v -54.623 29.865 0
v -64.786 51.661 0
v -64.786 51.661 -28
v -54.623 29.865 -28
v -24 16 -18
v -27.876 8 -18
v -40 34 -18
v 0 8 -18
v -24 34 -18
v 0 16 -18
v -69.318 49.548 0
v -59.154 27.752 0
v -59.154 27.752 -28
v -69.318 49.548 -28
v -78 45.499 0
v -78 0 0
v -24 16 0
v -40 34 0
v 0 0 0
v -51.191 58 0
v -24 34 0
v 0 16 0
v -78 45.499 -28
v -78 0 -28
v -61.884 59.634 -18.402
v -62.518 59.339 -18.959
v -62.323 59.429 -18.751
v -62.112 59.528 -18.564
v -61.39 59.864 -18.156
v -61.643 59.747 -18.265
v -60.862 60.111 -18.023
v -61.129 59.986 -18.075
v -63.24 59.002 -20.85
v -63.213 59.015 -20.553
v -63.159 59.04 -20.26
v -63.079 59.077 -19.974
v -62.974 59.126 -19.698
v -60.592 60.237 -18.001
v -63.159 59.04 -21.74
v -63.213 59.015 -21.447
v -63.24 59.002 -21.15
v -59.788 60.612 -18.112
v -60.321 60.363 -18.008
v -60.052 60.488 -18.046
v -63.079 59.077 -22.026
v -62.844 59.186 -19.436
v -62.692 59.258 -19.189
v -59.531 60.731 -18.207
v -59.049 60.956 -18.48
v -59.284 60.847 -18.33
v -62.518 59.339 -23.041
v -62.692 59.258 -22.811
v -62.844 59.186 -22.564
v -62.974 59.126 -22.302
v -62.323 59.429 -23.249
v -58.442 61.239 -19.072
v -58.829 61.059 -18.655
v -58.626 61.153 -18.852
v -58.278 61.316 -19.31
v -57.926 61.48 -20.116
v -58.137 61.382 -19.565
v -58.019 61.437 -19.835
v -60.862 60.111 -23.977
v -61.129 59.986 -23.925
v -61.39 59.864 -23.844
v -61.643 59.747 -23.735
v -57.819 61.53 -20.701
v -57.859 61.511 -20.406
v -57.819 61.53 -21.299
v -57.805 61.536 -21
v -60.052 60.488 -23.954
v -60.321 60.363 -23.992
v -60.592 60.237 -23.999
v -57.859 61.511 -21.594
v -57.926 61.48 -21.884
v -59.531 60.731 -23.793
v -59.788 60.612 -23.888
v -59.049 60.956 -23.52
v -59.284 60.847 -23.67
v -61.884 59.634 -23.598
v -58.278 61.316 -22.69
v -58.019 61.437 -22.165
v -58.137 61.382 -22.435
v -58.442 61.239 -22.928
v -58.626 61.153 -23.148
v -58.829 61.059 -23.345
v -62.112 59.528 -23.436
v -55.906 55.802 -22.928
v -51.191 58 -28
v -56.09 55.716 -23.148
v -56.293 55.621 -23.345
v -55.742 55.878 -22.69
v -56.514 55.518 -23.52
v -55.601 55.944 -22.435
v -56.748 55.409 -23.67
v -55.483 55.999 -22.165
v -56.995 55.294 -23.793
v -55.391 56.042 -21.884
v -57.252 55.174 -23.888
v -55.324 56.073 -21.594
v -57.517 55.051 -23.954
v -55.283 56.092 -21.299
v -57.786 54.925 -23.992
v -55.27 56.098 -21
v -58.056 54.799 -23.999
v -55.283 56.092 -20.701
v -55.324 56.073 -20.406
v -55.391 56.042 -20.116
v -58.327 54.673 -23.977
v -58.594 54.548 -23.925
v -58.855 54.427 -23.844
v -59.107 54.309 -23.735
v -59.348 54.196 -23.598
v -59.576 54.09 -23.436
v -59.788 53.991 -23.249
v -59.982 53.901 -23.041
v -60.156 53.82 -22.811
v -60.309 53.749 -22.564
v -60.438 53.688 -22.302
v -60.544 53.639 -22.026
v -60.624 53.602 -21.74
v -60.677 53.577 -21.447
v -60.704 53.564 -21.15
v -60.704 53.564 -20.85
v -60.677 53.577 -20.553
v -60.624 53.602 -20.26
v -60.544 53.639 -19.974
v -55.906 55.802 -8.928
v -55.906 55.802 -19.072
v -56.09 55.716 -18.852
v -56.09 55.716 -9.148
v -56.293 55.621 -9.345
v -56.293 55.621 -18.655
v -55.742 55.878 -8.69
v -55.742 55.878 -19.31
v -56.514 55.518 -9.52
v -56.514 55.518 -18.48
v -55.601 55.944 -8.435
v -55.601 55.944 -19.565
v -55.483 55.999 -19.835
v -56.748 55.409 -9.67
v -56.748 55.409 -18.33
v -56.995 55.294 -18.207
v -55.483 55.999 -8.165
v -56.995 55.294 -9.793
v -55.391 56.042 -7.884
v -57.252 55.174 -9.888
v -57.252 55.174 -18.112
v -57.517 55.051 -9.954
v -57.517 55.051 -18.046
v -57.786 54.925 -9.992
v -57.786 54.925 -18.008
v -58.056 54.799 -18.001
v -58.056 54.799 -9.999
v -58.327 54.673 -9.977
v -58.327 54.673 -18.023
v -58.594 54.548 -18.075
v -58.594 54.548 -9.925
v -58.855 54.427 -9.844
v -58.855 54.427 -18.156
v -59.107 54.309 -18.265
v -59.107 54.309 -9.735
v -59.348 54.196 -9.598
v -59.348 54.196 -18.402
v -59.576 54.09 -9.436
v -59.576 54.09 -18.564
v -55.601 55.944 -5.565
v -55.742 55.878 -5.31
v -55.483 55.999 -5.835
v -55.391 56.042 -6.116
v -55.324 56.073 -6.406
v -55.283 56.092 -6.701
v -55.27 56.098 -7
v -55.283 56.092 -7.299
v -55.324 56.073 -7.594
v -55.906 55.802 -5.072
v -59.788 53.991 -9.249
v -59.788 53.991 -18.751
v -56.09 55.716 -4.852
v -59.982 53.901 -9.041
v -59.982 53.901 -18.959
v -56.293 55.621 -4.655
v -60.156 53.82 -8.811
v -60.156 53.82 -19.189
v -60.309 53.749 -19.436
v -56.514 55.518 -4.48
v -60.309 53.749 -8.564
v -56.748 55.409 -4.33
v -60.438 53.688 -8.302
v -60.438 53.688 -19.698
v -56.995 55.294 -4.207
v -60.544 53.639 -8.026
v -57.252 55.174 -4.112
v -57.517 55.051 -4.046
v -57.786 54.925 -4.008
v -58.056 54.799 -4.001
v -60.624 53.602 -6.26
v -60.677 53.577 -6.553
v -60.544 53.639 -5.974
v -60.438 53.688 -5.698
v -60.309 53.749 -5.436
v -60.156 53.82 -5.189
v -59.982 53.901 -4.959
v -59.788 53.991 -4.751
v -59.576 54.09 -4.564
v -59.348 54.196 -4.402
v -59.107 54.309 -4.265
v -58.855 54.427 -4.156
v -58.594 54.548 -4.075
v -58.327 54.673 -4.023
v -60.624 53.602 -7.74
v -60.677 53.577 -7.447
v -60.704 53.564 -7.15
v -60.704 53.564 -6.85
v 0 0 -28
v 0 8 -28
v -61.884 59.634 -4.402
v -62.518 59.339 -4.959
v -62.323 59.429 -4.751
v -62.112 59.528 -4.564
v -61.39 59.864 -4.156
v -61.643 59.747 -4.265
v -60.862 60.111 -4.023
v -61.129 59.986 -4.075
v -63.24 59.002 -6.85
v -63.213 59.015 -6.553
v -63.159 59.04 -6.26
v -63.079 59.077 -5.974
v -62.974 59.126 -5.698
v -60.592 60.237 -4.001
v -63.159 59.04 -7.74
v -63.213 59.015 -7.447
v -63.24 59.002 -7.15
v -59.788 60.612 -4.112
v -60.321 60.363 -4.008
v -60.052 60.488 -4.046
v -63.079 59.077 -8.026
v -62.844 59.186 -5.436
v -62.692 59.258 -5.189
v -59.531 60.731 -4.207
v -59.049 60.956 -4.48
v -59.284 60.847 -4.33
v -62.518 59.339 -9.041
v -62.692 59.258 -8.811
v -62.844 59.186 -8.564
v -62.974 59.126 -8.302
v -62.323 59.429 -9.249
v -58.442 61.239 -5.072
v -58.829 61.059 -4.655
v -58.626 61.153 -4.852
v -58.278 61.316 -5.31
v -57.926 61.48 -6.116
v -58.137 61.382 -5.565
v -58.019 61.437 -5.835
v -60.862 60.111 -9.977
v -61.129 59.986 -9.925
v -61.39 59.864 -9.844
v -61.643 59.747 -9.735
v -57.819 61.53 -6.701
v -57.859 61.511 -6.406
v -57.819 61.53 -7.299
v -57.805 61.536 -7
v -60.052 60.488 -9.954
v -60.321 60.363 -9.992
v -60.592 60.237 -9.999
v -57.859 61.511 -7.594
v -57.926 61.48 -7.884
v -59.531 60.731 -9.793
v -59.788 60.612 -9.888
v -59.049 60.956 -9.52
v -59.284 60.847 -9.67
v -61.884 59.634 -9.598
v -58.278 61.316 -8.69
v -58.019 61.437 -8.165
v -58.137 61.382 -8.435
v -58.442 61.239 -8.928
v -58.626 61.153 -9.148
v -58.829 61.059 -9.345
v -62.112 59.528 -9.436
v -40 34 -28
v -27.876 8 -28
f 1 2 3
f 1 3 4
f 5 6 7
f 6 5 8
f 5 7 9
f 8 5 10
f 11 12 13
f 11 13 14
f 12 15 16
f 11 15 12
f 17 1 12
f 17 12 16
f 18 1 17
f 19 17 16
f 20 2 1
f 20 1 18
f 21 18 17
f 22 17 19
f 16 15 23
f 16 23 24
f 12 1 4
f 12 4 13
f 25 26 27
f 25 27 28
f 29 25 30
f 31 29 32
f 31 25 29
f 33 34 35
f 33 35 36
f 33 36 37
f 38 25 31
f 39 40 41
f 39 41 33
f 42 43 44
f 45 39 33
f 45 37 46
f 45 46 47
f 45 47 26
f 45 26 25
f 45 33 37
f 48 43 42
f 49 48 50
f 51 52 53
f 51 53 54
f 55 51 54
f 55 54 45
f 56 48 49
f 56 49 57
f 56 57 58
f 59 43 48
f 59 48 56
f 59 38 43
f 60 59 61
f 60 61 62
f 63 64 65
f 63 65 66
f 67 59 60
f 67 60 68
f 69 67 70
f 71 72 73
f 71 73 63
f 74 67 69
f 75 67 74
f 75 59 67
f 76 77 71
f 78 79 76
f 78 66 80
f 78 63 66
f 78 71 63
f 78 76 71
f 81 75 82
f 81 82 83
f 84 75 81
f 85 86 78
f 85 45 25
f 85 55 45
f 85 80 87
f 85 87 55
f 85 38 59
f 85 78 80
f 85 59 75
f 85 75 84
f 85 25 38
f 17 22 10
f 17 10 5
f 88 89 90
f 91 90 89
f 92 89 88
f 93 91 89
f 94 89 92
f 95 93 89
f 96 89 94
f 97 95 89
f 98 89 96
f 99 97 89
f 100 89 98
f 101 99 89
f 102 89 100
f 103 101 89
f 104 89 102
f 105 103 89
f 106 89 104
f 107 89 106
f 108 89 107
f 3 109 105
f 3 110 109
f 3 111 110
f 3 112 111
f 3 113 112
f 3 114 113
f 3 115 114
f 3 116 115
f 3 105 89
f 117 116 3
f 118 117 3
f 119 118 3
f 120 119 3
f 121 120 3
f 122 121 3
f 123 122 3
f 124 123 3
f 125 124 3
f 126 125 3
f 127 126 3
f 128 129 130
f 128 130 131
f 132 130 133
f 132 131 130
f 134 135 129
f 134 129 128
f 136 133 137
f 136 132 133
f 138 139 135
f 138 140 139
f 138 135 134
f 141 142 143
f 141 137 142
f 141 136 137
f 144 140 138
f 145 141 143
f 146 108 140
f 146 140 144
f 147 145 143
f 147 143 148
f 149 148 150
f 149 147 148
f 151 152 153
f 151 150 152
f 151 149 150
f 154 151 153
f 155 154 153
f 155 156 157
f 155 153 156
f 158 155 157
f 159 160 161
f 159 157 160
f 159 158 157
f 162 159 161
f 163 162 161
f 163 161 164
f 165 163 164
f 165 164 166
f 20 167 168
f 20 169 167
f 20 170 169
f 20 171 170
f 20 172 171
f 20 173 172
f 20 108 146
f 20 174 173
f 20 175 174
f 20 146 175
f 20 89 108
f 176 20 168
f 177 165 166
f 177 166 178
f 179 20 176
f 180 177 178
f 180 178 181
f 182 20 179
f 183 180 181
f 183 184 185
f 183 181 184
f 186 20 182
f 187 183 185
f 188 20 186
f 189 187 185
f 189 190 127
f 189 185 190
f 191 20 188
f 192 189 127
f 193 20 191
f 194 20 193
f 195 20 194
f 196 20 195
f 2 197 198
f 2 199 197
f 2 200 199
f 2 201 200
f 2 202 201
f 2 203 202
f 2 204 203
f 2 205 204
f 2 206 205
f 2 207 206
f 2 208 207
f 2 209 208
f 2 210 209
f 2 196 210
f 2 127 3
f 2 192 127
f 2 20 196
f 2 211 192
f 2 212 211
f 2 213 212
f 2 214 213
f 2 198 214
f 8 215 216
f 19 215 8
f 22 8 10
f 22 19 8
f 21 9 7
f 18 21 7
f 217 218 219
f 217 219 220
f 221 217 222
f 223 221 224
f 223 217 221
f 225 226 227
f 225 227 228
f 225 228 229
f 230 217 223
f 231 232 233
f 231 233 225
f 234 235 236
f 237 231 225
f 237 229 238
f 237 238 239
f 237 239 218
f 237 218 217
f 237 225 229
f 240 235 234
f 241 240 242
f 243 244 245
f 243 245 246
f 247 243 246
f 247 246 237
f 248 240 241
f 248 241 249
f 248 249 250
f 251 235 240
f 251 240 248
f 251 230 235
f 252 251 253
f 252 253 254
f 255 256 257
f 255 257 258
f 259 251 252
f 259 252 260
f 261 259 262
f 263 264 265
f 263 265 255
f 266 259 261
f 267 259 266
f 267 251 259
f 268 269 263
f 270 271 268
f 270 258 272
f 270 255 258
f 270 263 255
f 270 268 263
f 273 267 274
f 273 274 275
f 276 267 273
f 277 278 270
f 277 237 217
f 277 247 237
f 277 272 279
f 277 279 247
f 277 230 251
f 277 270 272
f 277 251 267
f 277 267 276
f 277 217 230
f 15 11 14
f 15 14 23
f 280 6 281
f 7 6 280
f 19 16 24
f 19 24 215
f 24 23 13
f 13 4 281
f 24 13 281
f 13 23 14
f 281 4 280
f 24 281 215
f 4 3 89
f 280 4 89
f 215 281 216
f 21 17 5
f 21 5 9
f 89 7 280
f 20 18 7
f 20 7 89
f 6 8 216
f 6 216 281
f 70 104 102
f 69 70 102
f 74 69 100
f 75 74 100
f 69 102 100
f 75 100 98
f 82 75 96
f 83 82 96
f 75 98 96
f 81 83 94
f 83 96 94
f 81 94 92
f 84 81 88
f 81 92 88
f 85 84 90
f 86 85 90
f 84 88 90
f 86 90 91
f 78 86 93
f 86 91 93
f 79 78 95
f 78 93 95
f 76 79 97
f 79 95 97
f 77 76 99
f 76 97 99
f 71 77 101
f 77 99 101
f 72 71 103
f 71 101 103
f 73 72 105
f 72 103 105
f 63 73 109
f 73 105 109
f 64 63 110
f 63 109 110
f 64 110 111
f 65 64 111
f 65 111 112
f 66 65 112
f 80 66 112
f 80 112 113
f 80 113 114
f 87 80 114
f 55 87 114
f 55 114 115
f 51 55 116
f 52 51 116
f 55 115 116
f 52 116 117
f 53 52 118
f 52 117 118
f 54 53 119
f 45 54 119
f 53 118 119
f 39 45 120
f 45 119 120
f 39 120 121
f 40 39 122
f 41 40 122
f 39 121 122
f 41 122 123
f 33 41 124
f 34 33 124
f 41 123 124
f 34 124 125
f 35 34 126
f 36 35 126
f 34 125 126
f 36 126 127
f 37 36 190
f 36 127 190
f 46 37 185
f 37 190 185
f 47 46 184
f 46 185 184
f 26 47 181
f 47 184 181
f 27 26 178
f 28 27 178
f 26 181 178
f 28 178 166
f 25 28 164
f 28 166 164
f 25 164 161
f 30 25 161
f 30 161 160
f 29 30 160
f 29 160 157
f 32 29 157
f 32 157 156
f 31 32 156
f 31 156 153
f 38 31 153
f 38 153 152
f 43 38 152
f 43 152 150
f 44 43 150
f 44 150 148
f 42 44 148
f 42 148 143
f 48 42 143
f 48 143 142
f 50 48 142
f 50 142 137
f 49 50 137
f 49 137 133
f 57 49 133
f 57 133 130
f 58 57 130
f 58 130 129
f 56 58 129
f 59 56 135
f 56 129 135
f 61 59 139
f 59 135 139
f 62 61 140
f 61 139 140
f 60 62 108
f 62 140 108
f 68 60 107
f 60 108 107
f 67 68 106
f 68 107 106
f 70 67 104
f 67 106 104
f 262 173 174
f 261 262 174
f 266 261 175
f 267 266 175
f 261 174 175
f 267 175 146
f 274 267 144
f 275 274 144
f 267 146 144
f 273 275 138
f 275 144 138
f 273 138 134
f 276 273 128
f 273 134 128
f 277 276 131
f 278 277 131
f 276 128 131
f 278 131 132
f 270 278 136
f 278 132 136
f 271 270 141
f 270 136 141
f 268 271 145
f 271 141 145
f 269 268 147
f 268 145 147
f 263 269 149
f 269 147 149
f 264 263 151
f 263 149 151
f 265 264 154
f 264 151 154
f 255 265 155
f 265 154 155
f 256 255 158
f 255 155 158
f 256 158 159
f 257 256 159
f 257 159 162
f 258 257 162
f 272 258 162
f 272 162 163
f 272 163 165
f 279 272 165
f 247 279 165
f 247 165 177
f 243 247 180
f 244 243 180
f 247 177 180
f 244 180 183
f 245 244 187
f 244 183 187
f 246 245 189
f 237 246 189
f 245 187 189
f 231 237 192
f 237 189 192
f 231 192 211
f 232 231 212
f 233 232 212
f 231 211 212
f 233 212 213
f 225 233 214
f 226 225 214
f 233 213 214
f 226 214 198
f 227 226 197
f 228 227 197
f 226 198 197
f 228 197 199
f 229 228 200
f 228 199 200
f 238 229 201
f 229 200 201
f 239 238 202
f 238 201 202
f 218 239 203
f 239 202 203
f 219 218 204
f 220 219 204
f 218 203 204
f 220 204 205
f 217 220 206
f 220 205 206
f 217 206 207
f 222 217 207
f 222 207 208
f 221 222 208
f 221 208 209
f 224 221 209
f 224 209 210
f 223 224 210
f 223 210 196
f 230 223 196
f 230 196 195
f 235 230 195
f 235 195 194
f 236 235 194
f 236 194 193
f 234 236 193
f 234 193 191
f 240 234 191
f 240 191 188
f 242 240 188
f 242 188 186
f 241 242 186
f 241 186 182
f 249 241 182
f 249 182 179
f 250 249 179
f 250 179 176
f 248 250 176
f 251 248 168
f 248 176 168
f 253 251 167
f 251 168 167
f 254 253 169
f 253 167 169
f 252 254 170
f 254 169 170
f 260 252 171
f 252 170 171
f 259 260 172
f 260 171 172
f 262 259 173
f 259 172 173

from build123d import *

# Parameters (mm, degrees)
BOSS_EXTRUDE1_DEPTH = 18
BOSS_EXTRUDE2_DEPTH = 28
SKETCH4_R           = 3
BOSS_EXTRUDE3_DEPTH = 6


with BuildPart() as part:
    # Sketch1 → Boss-Extrude1 (new body)
    with BuildSketch(Plane.XY):
        Polygon((-27.876000888, 8), (0, 8), (0, 16), (-24, 16), (-24, 34), (-40, 34), align=None)
    extrude(amount=-BOSS_EXTRUDE1_DEPTH)

    # Sketch1<4> → Boss-Extrude2 (add)
    with BuildSketch(Plane.XY):
        Polygon((-78, 0), (0, 0), (0, 8), (-27.876000888, 8), (-40, 34), (-51.191383796, 58), (-64.786000601, 51.660726074), (-54.622678955, 29.865412469), (-59.154217891, 27.75232116), (-69.317539536, 49.547634765), (-78, 45.498936959), align=None)
    extrude(amount=-BOSS_EXTRUDE2_DEPTH)

    # Sketch4 → Boss-Extrude3 (add)
    with BuildSketch(Plane(origin=(-31.358387135, 67.248278227, 0), x_dir=(0.9063077870366475, 0.42261826174070477, 0), z_dir=(-0.42261826174070477, 0.9063077870366475, 0))):
        with Locations((-29.383290582, 7)):
            Circle(SKETCH4_R)
        with Locations((-29.383290582, 21)):
            Circle(SKETCH4_R)
    extrude(amount=BOSS_EXTRUDE3_DEPTH)


solid = part.part
